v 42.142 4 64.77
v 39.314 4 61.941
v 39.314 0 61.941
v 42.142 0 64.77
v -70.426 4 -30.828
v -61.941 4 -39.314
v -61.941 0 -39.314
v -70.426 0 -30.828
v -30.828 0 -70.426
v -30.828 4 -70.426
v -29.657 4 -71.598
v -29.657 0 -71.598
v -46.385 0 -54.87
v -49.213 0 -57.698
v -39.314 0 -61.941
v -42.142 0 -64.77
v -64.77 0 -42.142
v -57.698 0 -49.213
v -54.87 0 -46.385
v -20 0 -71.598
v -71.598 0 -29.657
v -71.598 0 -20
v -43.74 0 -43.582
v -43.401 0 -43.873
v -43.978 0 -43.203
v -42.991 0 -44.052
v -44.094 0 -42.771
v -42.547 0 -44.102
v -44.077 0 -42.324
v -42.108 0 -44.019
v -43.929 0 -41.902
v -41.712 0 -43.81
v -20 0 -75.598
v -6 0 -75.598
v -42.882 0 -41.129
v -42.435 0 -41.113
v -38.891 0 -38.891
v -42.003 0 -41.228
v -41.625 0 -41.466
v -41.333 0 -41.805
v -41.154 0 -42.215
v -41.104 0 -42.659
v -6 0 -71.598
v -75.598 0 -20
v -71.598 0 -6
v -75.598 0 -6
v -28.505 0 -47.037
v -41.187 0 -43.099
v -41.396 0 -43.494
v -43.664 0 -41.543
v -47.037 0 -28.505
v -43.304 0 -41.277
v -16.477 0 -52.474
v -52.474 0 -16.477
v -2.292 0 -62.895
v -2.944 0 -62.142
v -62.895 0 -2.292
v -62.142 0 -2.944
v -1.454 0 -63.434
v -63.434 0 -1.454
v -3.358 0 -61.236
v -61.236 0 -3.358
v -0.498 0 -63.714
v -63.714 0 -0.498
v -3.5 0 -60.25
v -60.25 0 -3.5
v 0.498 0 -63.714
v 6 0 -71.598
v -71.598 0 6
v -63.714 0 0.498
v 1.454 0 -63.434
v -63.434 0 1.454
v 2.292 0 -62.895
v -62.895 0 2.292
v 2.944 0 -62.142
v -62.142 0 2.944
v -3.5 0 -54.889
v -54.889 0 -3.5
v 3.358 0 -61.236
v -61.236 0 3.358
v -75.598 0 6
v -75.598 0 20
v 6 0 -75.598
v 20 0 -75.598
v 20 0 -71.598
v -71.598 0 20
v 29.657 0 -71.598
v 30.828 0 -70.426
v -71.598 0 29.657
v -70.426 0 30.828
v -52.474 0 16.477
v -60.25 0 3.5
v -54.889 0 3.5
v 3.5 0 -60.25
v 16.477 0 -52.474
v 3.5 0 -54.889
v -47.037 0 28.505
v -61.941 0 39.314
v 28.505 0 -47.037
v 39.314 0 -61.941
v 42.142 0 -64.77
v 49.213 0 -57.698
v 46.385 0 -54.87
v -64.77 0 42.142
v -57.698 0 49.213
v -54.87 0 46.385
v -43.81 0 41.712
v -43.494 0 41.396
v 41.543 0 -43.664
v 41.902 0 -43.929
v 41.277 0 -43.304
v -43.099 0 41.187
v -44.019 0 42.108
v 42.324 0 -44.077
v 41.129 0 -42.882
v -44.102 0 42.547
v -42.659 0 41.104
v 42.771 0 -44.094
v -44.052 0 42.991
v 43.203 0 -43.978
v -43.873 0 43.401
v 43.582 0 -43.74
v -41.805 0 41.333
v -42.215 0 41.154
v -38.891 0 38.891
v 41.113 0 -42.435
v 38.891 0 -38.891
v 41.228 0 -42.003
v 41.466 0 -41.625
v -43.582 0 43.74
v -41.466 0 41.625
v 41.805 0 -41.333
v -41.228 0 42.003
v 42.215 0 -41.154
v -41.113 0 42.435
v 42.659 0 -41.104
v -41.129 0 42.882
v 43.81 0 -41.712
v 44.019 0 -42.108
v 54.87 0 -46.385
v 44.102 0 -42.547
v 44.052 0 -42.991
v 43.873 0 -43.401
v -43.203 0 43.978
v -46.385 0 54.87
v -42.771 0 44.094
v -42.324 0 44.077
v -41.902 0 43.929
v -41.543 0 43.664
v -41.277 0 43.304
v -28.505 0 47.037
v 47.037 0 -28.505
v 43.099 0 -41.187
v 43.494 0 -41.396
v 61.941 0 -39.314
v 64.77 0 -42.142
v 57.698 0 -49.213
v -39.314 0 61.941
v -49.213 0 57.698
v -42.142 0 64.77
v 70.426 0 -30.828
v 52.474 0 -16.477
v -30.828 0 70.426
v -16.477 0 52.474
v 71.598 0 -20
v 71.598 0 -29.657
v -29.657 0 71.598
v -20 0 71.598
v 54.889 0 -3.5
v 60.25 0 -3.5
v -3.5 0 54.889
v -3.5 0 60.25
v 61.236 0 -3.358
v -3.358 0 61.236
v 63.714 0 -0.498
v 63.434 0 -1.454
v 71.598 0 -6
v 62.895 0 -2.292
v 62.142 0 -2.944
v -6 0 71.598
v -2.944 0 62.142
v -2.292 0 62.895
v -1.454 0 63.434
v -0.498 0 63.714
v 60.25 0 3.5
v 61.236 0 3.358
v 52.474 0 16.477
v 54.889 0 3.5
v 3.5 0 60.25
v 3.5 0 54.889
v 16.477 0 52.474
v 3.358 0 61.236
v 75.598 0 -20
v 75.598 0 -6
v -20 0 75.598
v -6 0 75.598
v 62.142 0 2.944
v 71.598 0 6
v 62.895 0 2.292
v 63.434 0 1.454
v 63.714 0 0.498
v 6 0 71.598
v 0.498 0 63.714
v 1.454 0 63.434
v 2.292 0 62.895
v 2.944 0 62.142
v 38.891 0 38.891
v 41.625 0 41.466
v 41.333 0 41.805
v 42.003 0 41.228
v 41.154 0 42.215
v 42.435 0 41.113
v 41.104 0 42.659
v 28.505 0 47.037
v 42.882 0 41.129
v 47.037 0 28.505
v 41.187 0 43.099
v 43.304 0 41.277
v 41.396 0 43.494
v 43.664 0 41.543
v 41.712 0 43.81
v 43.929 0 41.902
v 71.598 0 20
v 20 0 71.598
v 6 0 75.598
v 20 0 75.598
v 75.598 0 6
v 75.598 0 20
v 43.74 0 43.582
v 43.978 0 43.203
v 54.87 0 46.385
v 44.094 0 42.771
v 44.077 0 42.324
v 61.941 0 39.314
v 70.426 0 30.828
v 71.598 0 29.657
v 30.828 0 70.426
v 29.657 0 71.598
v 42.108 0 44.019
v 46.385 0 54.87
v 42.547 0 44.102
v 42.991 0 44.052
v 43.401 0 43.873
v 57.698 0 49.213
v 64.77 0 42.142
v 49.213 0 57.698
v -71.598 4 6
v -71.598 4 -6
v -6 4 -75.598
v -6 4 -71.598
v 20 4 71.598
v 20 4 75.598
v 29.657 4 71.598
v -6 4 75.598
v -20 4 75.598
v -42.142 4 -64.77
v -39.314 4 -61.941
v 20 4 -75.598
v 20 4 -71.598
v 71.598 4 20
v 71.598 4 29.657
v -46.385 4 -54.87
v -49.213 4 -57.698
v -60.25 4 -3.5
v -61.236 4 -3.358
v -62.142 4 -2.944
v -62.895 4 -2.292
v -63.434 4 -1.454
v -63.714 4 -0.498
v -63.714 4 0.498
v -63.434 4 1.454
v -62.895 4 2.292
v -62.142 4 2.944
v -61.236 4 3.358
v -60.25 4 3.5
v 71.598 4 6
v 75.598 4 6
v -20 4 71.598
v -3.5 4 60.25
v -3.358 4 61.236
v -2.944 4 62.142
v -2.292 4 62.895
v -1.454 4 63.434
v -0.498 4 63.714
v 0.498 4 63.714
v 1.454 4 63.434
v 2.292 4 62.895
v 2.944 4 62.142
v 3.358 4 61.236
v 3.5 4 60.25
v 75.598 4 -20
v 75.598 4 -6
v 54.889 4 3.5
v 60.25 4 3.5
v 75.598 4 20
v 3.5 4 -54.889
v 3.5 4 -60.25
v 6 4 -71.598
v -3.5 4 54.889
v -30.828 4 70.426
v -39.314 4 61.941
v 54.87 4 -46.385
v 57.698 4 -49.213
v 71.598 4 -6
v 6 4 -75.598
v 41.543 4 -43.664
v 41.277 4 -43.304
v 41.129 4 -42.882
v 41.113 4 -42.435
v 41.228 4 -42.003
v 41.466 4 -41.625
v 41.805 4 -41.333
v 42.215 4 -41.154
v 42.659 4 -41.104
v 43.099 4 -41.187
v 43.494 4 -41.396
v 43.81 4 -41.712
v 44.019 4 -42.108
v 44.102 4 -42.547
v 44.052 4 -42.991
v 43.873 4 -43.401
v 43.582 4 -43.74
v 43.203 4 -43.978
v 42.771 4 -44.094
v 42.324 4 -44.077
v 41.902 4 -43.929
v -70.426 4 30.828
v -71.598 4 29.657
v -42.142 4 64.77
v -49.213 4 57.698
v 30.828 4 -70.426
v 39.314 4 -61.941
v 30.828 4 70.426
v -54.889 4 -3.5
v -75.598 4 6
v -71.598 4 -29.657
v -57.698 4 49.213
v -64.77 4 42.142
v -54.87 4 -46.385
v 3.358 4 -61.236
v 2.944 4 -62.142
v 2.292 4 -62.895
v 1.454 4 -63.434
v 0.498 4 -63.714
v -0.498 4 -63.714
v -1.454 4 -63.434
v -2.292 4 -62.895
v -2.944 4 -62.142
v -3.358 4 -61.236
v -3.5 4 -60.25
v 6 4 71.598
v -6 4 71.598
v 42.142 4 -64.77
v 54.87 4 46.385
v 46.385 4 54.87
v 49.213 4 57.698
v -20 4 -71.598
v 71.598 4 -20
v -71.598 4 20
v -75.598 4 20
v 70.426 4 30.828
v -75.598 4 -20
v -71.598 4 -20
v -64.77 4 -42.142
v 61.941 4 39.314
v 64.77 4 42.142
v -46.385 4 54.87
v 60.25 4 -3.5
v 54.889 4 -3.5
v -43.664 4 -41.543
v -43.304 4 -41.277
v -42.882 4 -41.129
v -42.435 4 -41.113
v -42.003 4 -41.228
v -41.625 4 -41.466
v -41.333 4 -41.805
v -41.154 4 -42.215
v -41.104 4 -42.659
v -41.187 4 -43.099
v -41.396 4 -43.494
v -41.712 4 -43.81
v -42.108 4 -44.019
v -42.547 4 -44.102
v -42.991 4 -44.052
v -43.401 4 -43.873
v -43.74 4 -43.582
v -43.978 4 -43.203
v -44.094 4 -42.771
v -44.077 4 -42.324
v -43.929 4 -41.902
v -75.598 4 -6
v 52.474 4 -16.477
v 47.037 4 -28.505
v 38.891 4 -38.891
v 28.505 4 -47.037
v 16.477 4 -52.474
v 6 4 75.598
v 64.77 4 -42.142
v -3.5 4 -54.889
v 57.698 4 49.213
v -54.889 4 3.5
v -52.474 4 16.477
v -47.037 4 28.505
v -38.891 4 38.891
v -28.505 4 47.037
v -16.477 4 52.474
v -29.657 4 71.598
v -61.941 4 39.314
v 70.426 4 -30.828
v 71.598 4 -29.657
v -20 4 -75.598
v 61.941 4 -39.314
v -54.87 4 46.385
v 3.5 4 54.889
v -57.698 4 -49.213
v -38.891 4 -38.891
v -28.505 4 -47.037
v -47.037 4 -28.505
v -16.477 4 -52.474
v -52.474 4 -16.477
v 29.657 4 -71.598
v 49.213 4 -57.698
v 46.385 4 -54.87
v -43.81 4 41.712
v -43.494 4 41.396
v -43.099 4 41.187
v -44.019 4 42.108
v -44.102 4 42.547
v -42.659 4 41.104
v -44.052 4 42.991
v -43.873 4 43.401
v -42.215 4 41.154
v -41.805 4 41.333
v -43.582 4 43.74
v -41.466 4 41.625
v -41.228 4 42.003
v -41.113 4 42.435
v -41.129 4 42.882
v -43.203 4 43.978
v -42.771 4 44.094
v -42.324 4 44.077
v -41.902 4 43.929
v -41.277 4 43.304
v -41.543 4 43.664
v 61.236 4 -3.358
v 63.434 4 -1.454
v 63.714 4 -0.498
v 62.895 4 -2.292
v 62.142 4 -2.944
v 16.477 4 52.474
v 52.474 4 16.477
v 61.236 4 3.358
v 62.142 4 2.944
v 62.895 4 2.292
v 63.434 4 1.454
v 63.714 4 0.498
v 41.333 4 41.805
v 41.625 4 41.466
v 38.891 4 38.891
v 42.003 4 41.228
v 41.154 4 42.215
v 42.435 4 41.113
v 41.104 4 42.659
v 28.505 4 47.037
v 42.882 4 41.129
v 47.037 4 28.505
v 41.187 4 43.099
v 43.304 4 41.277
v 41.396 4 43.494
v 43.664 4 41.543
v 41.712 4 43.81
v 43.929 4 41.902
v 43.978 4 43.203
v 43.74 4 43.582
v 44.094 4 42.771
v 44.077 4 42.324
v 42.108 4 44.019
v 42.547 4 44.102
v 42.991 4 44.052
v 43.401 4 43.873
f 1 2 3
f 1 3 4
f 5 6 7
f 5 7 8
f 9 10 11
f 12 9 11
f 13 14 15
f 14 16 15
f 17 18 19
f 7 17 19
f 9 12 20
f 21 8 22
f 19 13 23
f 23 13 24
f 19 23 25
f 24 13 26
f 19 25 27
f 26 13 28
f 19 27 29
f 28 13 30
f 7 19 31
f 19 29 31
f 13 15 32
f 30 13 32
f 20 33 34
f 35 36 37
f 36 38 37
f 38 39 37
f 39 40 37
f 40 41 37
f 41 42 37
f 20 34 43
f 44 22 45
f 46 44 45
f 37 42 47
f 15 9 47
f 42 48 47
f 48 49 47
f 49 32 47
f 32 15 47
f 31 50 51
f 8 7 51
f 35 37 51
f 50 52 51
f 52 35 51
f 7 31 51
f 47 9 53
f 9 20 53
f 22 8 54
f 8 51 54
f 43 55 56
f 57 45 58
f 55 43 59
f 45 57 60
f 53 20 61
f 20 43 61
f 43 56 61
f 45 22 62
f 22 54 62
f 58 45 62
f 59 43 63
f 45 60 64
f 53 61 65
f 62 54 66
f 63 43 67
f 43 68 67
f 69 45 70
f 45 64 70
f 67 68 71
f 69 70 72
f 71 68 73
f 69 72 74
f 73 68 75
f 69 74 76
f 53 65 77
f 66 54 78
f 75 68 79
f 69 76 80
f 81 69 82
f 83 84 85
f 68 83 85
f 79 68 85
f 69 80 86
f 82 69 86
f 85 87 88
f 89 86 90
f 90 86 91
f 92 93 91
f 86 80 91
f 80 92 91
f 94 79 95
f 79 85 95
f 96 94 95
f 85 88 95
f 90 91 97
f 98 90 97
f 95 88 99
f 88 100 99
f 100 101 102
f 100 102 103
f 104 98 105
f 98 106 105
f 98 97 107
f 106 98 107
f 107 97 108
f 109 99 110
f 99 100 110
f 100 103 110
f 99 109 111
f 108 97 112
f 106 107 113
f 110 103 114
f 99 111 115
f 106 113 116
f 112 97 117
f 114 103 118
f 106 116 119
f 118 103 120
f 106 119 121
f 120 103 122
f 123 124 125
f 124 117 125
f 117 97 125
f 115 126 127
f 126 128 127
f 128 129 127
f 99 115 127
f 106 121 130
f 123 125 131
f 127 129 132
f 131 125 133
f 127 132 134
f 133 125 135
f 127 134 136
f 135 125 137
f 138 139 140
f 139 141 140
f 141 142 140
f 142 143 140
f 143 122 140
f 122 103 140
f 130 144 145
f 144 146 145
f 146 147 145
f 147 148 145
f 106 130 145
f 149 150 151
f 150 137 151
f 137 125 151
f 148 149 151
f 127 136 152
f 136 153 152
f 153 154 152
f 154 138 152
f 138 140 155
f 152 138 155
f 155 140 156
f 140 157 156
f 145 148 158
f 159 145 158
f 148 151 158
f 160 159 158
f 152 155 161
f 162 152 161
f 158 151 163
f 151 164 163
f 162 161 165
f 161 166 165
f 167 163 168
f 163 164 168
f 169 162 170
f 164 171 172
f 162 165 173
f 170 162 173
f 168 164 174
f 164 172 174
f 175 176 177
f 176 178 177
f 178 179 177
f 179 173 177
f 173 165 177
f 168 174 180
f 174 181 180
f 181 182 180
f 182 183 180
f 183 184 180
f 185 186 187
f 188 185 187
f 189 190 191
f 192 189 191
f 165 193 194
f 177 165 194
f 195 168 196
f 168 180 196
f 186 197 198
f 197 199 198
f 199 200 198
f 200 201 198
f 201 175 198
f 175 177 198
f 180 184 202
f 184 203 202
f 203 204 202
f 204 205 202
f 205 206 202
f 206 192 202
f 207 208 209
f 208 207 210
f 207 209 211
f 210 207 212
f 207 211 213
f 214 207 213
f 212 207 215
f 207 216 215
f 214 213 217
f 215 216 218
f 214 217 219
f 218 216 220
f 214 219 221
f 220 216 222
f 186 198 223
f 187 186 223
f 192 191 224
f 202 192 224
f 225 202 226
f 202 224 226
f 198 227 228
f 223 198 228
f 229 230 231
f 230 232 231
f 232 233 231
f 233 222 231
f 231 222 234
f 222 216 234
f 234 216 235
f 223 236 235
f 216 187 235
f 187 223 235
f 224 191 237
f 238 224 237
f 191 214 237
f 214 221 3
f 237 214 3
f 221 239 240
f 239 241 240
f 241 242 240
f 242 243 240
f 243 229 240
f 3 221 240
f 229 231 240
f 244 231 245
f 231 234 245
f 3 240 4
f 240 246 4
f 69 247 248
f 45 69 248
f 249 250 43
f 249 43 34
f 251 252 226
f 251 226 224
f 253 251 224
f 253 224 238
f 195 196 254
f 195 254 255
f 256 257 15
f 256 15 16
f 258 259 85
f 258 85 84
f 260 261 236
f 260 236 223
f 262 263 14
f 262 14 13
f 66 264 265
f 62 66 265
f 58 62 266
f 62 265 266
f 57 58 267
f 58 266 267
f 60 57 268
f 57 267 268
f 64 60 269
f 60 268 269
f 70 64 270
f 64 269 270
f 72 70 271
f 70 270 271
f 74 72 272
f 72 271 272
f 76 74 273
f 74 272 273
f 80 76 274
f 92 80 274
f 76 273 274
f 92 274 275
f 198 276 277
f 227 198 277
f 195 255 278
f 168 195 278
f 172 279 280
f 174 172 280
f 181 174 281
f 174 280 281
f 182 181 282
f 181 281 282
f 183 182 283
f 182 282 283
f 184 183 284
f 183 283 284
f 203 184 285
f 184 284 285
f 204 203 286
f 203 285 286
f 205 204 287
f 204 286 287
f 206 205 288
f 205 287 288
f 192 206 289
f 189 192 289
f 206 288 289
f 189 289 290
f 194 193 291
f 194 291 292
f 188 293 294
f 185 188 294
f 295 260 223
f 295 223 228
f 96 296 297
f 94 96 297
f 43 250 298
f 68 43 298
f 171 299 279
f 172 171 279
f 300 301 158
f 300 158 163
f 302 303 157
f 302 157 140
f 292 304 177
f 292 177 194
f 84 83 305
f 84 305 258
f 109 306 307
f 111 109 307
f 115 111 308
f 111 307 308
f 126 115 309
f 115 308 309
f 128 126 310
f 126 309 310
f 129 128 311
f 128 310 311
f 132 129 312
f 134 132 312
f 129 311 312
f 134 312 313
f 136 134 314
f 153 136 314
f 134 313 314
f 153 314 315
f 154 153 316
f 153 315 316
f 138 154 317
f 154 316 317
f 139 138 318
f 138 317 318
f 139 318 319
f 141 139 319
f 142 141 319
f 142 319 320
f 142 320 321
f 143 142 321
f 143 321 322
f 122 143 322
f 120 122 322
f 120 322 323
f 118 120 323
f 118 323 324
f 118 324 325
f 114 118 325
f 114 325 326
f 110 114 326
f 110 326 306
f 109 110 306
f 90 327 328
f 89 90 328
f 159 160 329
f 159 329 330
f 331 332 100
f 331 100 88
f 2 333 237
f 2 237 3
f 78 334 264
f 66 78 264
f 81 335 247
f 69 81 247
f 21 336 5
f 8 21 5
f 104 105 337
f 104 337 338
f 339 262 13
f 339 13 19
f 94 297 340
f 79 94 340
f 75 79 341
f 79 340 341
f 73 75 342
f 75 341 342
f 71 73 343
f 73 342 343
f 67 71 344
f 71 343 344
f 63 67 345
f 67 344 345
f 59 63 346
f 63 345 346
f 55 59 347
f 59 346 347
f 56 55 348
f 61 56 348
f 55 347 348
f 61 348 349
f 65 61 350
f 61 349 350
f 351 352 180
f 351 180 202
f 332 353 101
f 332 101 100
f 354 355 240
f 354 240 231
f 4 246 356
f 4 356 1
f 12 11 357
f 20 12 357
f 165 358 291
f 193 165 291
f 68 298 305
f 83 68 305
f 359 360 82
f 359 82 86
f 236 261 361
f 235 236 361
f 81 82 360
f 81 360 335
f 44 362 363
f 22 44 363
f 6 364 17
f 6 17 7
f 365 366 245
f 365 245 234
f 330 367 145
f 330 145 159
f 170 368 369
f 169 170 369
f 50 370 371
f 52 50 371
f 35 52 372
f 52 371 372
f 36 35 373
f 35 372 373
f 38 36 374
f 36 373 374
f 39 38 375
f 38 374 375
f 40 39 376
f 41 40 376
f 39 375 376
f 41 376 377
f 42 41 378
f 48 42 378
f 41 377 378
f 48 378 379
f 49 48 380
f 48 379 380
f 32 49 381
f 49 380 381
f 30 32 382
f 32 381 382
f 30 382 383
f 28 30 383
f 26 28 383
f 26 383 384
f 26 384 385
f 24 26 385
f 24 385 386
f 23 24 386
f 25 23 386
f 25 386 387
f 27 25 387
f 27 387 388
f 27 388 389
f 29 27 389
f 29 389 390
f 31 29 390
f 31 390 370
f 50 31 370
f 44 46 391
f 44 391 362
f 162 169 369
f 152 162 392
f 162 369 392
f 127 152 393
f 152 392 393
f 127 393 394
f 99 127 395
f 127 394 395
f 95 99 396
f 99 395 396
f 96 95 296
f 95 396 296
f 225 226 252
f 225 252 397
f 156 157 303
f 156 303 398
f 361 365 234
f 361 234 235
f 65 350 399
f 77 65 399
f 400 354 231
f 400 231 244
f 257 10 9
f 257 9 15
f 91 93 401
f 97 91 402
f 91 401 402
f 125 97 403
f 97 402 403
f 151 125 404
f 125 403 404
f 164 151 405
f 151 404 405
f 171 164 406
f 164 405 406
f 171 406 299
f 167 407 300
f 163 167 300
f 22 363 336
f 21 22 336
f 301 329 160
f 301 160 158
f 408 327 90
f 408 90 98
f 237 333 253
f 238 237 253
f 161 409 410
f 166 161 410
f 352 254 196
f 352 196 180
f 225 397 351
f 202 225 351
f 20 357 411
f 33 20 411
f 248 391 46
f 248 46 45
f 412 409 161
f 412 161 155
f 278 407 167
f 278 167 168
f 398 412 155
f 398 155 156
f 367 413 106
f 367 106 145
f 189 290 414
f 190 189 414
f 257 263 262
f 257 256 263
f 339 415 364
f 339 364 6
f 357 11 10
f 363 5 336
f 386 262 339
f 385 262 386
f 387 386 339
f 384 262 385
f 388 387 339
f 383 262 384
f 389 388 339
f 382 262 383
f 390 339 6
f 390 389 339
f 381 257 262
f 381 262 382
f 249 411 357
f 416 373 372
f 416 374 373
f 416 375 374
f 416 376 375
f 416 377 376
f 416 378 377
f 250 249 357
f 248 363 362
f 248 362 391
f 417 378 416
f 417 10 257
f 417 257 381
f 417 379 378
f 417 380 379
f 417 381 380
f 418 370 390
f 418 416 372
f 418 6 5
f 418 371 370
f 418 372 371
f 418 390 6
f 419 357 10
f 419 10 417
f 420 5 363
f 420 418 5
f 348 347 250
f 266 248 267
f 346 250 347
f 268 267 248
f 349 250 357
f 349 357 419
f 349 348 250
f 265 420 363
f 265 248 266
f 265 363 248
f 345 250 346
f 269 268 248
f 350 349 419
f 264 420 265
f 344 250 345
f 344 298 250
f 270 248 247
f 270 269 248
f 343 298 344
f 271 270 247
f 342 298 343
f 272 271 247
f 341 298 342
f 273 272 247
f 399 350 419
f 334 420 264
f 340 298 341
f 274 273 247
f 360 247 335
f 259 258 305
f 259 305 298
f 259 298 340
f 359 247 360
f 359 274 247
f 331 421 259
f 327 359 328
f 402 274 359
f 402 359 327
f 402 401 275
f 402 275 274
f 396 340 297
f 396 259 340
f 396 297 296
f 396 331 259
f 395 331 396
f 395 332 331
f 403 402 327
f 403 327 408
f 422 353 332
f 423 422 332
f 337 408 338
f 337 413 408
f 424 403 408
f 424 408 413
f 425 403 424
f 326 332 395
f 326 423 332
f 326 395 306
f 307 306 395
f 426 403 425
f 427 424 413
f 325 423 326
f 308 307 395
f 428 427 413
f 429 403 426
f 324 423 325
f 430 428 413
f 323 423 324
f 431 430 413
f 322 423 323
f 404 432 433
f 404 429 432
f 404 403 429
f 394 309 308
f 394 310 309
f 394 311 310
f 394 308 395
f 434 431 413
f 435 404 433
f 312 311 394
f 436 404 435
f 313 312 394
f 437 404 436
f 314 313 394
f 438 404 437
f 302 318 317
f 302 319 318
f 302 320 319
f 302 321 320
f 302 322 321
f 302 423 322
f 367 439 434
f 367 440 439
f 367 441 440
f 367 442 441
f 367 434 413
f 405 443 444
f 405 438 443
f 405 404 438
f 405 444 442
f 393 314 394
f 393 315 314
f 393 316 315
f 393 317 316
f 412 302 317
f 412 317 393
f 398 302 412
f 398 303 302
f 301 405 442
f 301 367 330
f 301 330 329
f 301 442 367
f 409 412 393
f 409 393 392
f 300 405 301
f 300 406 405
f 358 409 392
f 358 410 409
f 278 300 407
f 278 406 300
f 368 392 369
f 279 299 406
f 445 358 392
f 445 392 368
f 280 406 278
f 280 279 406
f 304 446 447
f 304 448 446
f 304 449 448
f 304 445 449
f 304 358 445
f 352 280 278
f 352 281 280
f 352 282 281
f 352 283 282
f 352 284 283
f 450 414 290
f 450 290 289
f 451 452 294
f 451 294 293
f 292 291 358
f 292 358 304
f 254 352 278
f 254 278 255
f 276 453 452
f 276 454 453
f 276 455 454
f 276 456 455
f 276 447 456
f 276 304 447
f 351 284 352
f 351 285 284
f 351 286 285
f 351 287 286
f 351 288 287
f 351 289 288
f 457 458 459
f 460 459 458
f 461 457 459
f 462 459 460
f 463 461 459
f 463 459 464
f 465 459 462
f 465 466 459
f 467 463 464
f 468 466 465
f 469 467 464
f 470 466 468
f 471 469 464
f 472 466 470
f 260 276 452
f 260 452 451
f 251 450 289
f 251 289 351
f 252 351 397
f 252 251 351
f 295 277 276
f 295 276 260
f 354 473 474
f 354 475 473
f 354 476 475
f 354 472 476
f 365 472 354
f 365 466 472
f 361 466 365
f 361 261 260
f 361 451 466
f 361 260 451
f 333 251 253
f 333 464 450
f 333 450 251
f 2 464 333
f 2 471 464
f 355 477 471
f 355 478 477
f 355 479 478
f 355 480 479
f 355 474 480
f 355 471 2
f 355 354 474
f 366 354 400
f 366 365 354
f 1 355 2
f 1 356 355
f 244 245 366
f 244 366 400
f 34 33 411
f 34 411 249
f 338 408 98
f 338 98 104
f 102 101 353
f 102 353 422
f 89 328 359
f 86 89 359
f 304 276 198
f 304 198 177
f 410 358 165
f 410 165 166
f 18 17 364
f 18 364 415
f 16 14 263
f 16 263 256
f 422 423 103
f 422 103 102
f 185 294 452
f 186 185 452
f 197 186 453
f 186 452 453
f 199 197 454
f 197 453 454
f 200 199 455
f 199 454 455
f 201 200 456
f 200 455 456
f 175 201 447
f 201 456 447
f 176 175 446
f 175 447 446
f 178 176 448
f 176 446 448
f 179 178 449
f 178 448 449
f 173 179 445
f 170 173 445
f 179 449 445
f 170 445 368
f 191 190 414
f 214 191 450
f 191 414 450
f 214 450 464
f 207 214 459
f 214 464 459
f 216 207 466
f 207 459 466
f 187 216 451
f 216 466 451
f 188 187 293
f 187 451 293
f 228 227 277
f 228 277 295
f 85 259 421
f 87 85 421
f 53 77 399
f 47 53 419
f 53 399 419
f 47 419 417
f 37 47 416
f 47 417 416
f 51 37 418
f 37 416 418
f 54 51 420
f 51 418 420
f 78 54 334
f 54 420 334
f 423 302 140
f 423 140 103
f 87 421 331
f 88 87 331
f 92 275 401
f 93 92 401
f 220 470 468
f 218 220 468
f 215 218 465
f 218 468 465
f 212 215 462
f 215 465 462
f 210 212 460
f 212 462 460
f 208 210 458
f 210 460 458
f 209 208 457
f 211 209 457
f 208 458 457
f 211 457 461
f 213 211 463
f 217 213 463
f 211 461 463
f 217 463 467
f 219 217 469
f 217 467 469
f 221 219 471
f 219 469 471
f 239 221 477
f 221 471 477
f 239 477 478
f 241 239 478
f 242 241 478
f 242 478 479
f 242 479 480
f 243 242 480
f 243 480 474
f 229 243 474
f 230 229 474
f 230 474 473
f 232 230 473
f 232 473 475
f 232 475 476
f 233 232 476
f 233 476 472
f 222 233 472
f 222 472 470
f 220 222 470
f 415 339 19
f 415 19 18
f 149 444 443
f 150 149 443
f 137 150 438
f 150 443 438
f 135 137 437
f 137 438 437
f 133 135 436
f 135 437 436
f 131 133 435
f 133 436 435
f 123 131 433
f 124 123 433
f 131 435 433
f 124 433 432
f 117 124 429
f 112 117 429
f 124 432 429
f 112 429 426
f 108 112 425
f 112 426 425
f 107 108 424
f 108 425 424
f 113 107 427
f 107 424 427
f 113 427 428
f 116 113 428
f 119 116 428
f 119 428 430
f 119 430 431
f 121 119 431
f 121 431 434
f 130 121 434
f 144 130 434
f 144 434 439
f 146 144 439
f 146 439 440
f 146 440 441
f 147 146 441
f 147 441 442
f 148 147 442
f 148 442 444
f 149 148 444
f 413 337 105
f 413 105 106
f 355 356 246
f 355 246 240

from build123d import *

# Parameters (mm, degrees)
SKETCH1_R           = 100
BOSS_EXTRUDE1_DEPTH = 4
SKETCH2_W           = 4
SKETCH2_H           = 12
SKETCH2_W_2         = 12
SKETCH2_H_2         = 4
CUT_EXTRUDE1_DEPTH  = 4
CUT_EXTRUDE3_START  = -4
SKETCH3_R           = 100
CUT_EXTRUDE3_DEPTH  = 4
SKETCH5_R           = 55
CUT_EXTRUDE4_DEPTH  = 107.986490191
SKETCH6_R           = 1.5
CUT_EXTRUDE5_DEPTH  = 107.986490191
CIRPATTERN1_COUNT   = 8
SKETCH7_R           = 3.5
CUT_EXTRUDE6_DEPTH  = 10
CIRPATTERN2_COUNT   = 4


with BuildPart() as part:
    # Sketch1 → Boss-Extrude1 (new body)
    with BuildSketch(Plane(origin=(0, 0, 0), x_dir=(1, 0, 0), z_dir=(0, 1, 0))):
        with Locations(Location((0, 0, 0), (0, 0, 270))):
            Circle(SKETCH1_R)
    extrude(amount=BOSS_EXTRUDE1_DEPTH)

    # Sketch2 → Cut-Extrude1 (cut)
    with BuildSketch(Plane(origin=(0, 4, 0), x_dir=(1, 0, 0), z_dir=(0, 1, 0))):
        with Locations((-73.597979746, -26)):
            Rectangle(SKETCH2_W, SKETCH2_H)
        with Locations((-73.597979746, 0)):
            Rectangle(SKETCH2_W, SKETCH2_H)
        with Locations((-73.597979746, 26)):
            Rectangle(SKETCH2_W, SKETCH2_H)
        Polygon((-70.426406871, 30.828427125), (-73.254833996, 33.656854249), (-64.769552622, 42.142135624), (-61.941125497, 39.313708499), align=None)
        Polygon((-54.870057685, 46.384776311), (-57.69848481, 49.213203436), (-49.213203436, 57.69848481), (-46.384776311, 54.870057685), align=None)
        Polygon((-39.313708499, 61.941125497), (-42.142135624, 64.769552622), (-33.656854249, 73.254833996), (-30.828427125, 70.426406871), align=None)
        with Locations((-26, 73.597979746)):
            Rectangle(SKETCH2_W_2, SKETCH2_H_2)
        with Locations((0, 73.597979746)):
            Rectangle(SKETCH2_W_2, SKETCH2_H_2)
        with Locations((26, 73.597979746)):
            Rectangle(SKETCH2_W_2, SKETCH2_H_2)
        Polygon((42.142135624, 64.769552622), (39.313708499, 61.941125497), (30.828427125, 70.426406871), (33.656854249, 73.254833996), align=None)
        Polygon((57.69848481, 49.213203436), (54.870057685, 46.384776311), (46.384776311, 54.870057685), (49.213203436, 57.69848481), align=None)
        Polygon((73.254833996, 33.656854249), (70.426406871, 30.828427125), (61.941125497, 39.313708499), (64.769552622, 42.142135624), align=None)
        with Locations((73.597979746, 0)):
            Rectangle(SKETCH2_W, SKETCH2_H)
        with Locations((73.597979746, 26)):
            Rectangle(SKETCH2_W, SKETCH2_H)
        with Locations((73.597979746, -26)):
            Rectangle(SKETCH2_W, SKETCH2_H)
        Polygon((64.769552622, -42.142135624), (61.941125497, -39.313708499), (70.426406871, -30.828427125), (73.254833996, -33.656854249), align=None)
        Polygon((71.597979746, -32), (71.597979746, -29.656854249), (70.426406871, -30.828427125), align=None)
        Polygon((49.213203436, -57.69848481), (46.384776311, -54.870057685), (54.870057685, -46.384776311), (57.69848481, -49.213203436), align=None)
        Polygon((33.656854249, -73.254833996), (30.828427125, -70.426406871), (39.313708499, -61.941125497), (42.142135624, -64.769552622), align=None)
        Polygon((32, -71.597979746), (30.828427125, -70.426406871), (29.656854249, -71.597979746), align=None)
        with Locations((26, -73.597979746)):
            Rectangle(SKETCH2_W_2, SKETCH2_H_2)
        with Locations((0, -73.597979746)):
            Rectangle(SKETCH2_W_2, SKETCH2_H_2)
        with Locations((-26, -73.597979746)):
            Rectangle(SKETCH2_W_2, SKETCH2_H_2)
        Polygon((-29.656854249, -71.597979746), (-30.828427125, -70.426406871), (-32, -71.597979746), align=None)
        Polygon((-30.828427125, -70.426406871), (-33.656854249, -73.254833996), (-42.142135624, -64.769552622), (-39.313708499, -61.941125497), align=None)
        Polygon((-46.384776311, -54.870057685), (-49.213203436, -57.69848481), (-57.69848481, -49.213203436), (-54.870057685, -46.384776311), align=None)
        Polygon((-61.941125497, -39.313708499), (-64.769552622, -42.142135624), (-73.254833996, -33.656854249), (-70.426406871, -30.828427125), align=None)
        Polygon((-70.426406871, -30.828427125), (-71.597979746, -29.656854249), (-71.597979746, -32), align=None)
        Polygon((-71.597979746, 29.656854249), (-70.426406871, 30.828427125), (-71.597979746, 32), align=None)
        Polygon((-29.656854249, 71.597979746), (-32, 71.597979746), (-30.828427125, 70.426406871), align=None)
        Polygon((32, 71.597979746), (29.656854249, 71.597979746), (30.828427125, 70.426406871), align=None)
        Polygon((71.597979746, 32), (70.426406871, 30.828427125), (71.597979746, 29.656854249), align=None)
    extrude(amount=-CUT_EXTRUDE1_DEPTH, mode=Mode.SUBTRACT)

    # Sketch3 → Cut-Extrude3 (cut)
    # profile 1 of 5: a face of its own
    with BuildSketch(Plane(origin=(0, 4, 0), x_dir=(1, 0, 0), z_dir=(0, 1, 0)).offset(CUT_EXTRUDE3_START)):
        Circle(SKETCH3_R)
        Polygon((75.597979746, -32), (32, -75.597979746), (-32, -75.597979746), (-75.597979746, -32), (-75.597979746, 32), (-32, 75.597979746), (32, 75.597979746), (75.597979746, 32), align=None, mode=Mode.SUBTRACT)
    # profile 2 of 5: a face of its own
    with BuildSketch(Plane(origin=(0, 4, 0), x_dir=(1, 0, 0), z_dir=(0, 1, 0)).offset(CUT_EXTRUDE3_START)):
        Polygon((-75.597979746, 32), (-75.597979746, 30.611659087), (-70.199499966, 31.905014714), (-64.769552622, 42.142135624), (-42.142135624, 64.769552622), (-31.064182622, 71.665632478), (-28.788746713, 75.597979746), (-32, 75.597979746), align=None)
    # profile 3 of 5: a face of its own
    with BuildSketch(Plane(origin=(0, 4, 0), x_dir=(1, 0, 0), z_dir=(0, 1, 0)).offset(CUT_EXTRUDE3_START)):
        Polygon((-75.597979746, -32), (-32, -75.597979746), (-29.093903597, -75.597979746), (-30.351010999, -72.169062048), (-42.142135624, -64.769552622), (-64.769552622, -42.142135624), (-71.252442115, -31.167934151), (-75.597979746, -30.54862762), align=None)
    # profile 4 of 5: a face of its own
    with BuildSketch(Plane(origin=(0, 4, 0), x_dir=(1, 0, 0), z_dir=(0, 1, 0)).offset(CUT_EXTRUDE3_START)):
        Polygon((32, -70.176952979), (27.328089277, -75.597979746), (32, -75.597979746), (75.597979746, -32), (75.597979746, -29.546495423), (70.83875298, -31.3565945), (64.769552622, -42.142135624), (42.142135624, -64.769552622), align=None)
    # profile 5 of 5: a face of its own
    with BuildSketch(Plane(origin=(0, 4, 0), x_dir=(1, 0, 0), z_dir=(0, 1, 0)).offset(CUT_EXTRUDE3_START)):
        Polygon((70.83875298, 31.531789385), (75.597979746, 29.562368083), (75.597979746, 32), (32, 75.597979746), (29.807879635, 75.597979746), (31.156089891, 71.258119345), (42.142135624, 64.769552622), (64.769552622, 42.142135624), align=None)
    extrude(amount=CUT_EXTRUDE3_DEPTH, mode=Mode.SUBTRACT)

    # Sketch5 → Cut-Extrude4 (cut, through all)
    with BuildSketch(Plane(origin=(0, 4, 0), x_dir=(1, 0, 0), z_dir=(0, 1, 0))):
        with Locations(Location((0, 0, 0), (0, 0, 270))):
            Circle(SKETCH5_R)
    extrude(amount=-CUT_EXTRUDE4_DEPTH, mode=Mode.SUBTRACT)

    # Sketch6 → Cut-Extrude5 (cut, through all)
    with BuildSketch(Plane(origin=(0, 4, 0), x_dir=(1, 0, 0), z_dir=(0, 1, 0))):
        with Locations(Location((-60.25, 0, 0), (0, 0, 270))):
            Circle(SKETCH6_R)
    cut_extrude5 = extrude(amount=-CUT_EXTRUDE5_DEPTH, mode=Mode.SUBTRACT)

    # CirPattern1: Cut-Extrude5 ×8 about axis
    cirpattern1_axis = Axis((0, 0, 0), (0, 1, 0))
    for i in range(1, CIRPATTERN1_COUNT):
        add(cut_extrude5.rotate(cirpattern1_axis, i * 360 / CIRPATTERN1_COUNT), mode=Mode.SUBTRACT)

    # Sketch7 → Cut-Extrude6 (cut)
    with BuildSketch(Plane(origin=(0, 4, 0), x_dir=(1, 0, 0), z_dir=(0, 1, 0))):
        with BuildLine():
            ThreePointArc((3.5, 60.25), (0, 56.75), (-3.5, 60.25))
            Line((-3.5, 60.25), (-3.5, 54.888523391))
            ThreePointArc((-3.5, 54.888523391), (0, 55), (3.5, 54.888523391))
            Line((3.5, 54.888523391), (3.5, 60.25))
        make_face()
        with Locations((0, 60.25)):
            Circle(SKETCH7_R)
    cut_extrude6 = extrude(amount=-CUT_EXTRUDE6_DEPTH, mode=Mode.SUBTRACT)

    # CirPattern2: Cut-Extrude6 ×4 about axis
    cirpattern2_axis = Axis((0, 0, 0), (0, 1, 0))
    for i in range(1, CIRPATTERN2_COUNT):
        add(cut_extrude6.rotate(cirpattern2_axis, i * 360 / CIRPATTERN2_COUNT), mode=Mode.SUBTRACT)


solid = part.part
